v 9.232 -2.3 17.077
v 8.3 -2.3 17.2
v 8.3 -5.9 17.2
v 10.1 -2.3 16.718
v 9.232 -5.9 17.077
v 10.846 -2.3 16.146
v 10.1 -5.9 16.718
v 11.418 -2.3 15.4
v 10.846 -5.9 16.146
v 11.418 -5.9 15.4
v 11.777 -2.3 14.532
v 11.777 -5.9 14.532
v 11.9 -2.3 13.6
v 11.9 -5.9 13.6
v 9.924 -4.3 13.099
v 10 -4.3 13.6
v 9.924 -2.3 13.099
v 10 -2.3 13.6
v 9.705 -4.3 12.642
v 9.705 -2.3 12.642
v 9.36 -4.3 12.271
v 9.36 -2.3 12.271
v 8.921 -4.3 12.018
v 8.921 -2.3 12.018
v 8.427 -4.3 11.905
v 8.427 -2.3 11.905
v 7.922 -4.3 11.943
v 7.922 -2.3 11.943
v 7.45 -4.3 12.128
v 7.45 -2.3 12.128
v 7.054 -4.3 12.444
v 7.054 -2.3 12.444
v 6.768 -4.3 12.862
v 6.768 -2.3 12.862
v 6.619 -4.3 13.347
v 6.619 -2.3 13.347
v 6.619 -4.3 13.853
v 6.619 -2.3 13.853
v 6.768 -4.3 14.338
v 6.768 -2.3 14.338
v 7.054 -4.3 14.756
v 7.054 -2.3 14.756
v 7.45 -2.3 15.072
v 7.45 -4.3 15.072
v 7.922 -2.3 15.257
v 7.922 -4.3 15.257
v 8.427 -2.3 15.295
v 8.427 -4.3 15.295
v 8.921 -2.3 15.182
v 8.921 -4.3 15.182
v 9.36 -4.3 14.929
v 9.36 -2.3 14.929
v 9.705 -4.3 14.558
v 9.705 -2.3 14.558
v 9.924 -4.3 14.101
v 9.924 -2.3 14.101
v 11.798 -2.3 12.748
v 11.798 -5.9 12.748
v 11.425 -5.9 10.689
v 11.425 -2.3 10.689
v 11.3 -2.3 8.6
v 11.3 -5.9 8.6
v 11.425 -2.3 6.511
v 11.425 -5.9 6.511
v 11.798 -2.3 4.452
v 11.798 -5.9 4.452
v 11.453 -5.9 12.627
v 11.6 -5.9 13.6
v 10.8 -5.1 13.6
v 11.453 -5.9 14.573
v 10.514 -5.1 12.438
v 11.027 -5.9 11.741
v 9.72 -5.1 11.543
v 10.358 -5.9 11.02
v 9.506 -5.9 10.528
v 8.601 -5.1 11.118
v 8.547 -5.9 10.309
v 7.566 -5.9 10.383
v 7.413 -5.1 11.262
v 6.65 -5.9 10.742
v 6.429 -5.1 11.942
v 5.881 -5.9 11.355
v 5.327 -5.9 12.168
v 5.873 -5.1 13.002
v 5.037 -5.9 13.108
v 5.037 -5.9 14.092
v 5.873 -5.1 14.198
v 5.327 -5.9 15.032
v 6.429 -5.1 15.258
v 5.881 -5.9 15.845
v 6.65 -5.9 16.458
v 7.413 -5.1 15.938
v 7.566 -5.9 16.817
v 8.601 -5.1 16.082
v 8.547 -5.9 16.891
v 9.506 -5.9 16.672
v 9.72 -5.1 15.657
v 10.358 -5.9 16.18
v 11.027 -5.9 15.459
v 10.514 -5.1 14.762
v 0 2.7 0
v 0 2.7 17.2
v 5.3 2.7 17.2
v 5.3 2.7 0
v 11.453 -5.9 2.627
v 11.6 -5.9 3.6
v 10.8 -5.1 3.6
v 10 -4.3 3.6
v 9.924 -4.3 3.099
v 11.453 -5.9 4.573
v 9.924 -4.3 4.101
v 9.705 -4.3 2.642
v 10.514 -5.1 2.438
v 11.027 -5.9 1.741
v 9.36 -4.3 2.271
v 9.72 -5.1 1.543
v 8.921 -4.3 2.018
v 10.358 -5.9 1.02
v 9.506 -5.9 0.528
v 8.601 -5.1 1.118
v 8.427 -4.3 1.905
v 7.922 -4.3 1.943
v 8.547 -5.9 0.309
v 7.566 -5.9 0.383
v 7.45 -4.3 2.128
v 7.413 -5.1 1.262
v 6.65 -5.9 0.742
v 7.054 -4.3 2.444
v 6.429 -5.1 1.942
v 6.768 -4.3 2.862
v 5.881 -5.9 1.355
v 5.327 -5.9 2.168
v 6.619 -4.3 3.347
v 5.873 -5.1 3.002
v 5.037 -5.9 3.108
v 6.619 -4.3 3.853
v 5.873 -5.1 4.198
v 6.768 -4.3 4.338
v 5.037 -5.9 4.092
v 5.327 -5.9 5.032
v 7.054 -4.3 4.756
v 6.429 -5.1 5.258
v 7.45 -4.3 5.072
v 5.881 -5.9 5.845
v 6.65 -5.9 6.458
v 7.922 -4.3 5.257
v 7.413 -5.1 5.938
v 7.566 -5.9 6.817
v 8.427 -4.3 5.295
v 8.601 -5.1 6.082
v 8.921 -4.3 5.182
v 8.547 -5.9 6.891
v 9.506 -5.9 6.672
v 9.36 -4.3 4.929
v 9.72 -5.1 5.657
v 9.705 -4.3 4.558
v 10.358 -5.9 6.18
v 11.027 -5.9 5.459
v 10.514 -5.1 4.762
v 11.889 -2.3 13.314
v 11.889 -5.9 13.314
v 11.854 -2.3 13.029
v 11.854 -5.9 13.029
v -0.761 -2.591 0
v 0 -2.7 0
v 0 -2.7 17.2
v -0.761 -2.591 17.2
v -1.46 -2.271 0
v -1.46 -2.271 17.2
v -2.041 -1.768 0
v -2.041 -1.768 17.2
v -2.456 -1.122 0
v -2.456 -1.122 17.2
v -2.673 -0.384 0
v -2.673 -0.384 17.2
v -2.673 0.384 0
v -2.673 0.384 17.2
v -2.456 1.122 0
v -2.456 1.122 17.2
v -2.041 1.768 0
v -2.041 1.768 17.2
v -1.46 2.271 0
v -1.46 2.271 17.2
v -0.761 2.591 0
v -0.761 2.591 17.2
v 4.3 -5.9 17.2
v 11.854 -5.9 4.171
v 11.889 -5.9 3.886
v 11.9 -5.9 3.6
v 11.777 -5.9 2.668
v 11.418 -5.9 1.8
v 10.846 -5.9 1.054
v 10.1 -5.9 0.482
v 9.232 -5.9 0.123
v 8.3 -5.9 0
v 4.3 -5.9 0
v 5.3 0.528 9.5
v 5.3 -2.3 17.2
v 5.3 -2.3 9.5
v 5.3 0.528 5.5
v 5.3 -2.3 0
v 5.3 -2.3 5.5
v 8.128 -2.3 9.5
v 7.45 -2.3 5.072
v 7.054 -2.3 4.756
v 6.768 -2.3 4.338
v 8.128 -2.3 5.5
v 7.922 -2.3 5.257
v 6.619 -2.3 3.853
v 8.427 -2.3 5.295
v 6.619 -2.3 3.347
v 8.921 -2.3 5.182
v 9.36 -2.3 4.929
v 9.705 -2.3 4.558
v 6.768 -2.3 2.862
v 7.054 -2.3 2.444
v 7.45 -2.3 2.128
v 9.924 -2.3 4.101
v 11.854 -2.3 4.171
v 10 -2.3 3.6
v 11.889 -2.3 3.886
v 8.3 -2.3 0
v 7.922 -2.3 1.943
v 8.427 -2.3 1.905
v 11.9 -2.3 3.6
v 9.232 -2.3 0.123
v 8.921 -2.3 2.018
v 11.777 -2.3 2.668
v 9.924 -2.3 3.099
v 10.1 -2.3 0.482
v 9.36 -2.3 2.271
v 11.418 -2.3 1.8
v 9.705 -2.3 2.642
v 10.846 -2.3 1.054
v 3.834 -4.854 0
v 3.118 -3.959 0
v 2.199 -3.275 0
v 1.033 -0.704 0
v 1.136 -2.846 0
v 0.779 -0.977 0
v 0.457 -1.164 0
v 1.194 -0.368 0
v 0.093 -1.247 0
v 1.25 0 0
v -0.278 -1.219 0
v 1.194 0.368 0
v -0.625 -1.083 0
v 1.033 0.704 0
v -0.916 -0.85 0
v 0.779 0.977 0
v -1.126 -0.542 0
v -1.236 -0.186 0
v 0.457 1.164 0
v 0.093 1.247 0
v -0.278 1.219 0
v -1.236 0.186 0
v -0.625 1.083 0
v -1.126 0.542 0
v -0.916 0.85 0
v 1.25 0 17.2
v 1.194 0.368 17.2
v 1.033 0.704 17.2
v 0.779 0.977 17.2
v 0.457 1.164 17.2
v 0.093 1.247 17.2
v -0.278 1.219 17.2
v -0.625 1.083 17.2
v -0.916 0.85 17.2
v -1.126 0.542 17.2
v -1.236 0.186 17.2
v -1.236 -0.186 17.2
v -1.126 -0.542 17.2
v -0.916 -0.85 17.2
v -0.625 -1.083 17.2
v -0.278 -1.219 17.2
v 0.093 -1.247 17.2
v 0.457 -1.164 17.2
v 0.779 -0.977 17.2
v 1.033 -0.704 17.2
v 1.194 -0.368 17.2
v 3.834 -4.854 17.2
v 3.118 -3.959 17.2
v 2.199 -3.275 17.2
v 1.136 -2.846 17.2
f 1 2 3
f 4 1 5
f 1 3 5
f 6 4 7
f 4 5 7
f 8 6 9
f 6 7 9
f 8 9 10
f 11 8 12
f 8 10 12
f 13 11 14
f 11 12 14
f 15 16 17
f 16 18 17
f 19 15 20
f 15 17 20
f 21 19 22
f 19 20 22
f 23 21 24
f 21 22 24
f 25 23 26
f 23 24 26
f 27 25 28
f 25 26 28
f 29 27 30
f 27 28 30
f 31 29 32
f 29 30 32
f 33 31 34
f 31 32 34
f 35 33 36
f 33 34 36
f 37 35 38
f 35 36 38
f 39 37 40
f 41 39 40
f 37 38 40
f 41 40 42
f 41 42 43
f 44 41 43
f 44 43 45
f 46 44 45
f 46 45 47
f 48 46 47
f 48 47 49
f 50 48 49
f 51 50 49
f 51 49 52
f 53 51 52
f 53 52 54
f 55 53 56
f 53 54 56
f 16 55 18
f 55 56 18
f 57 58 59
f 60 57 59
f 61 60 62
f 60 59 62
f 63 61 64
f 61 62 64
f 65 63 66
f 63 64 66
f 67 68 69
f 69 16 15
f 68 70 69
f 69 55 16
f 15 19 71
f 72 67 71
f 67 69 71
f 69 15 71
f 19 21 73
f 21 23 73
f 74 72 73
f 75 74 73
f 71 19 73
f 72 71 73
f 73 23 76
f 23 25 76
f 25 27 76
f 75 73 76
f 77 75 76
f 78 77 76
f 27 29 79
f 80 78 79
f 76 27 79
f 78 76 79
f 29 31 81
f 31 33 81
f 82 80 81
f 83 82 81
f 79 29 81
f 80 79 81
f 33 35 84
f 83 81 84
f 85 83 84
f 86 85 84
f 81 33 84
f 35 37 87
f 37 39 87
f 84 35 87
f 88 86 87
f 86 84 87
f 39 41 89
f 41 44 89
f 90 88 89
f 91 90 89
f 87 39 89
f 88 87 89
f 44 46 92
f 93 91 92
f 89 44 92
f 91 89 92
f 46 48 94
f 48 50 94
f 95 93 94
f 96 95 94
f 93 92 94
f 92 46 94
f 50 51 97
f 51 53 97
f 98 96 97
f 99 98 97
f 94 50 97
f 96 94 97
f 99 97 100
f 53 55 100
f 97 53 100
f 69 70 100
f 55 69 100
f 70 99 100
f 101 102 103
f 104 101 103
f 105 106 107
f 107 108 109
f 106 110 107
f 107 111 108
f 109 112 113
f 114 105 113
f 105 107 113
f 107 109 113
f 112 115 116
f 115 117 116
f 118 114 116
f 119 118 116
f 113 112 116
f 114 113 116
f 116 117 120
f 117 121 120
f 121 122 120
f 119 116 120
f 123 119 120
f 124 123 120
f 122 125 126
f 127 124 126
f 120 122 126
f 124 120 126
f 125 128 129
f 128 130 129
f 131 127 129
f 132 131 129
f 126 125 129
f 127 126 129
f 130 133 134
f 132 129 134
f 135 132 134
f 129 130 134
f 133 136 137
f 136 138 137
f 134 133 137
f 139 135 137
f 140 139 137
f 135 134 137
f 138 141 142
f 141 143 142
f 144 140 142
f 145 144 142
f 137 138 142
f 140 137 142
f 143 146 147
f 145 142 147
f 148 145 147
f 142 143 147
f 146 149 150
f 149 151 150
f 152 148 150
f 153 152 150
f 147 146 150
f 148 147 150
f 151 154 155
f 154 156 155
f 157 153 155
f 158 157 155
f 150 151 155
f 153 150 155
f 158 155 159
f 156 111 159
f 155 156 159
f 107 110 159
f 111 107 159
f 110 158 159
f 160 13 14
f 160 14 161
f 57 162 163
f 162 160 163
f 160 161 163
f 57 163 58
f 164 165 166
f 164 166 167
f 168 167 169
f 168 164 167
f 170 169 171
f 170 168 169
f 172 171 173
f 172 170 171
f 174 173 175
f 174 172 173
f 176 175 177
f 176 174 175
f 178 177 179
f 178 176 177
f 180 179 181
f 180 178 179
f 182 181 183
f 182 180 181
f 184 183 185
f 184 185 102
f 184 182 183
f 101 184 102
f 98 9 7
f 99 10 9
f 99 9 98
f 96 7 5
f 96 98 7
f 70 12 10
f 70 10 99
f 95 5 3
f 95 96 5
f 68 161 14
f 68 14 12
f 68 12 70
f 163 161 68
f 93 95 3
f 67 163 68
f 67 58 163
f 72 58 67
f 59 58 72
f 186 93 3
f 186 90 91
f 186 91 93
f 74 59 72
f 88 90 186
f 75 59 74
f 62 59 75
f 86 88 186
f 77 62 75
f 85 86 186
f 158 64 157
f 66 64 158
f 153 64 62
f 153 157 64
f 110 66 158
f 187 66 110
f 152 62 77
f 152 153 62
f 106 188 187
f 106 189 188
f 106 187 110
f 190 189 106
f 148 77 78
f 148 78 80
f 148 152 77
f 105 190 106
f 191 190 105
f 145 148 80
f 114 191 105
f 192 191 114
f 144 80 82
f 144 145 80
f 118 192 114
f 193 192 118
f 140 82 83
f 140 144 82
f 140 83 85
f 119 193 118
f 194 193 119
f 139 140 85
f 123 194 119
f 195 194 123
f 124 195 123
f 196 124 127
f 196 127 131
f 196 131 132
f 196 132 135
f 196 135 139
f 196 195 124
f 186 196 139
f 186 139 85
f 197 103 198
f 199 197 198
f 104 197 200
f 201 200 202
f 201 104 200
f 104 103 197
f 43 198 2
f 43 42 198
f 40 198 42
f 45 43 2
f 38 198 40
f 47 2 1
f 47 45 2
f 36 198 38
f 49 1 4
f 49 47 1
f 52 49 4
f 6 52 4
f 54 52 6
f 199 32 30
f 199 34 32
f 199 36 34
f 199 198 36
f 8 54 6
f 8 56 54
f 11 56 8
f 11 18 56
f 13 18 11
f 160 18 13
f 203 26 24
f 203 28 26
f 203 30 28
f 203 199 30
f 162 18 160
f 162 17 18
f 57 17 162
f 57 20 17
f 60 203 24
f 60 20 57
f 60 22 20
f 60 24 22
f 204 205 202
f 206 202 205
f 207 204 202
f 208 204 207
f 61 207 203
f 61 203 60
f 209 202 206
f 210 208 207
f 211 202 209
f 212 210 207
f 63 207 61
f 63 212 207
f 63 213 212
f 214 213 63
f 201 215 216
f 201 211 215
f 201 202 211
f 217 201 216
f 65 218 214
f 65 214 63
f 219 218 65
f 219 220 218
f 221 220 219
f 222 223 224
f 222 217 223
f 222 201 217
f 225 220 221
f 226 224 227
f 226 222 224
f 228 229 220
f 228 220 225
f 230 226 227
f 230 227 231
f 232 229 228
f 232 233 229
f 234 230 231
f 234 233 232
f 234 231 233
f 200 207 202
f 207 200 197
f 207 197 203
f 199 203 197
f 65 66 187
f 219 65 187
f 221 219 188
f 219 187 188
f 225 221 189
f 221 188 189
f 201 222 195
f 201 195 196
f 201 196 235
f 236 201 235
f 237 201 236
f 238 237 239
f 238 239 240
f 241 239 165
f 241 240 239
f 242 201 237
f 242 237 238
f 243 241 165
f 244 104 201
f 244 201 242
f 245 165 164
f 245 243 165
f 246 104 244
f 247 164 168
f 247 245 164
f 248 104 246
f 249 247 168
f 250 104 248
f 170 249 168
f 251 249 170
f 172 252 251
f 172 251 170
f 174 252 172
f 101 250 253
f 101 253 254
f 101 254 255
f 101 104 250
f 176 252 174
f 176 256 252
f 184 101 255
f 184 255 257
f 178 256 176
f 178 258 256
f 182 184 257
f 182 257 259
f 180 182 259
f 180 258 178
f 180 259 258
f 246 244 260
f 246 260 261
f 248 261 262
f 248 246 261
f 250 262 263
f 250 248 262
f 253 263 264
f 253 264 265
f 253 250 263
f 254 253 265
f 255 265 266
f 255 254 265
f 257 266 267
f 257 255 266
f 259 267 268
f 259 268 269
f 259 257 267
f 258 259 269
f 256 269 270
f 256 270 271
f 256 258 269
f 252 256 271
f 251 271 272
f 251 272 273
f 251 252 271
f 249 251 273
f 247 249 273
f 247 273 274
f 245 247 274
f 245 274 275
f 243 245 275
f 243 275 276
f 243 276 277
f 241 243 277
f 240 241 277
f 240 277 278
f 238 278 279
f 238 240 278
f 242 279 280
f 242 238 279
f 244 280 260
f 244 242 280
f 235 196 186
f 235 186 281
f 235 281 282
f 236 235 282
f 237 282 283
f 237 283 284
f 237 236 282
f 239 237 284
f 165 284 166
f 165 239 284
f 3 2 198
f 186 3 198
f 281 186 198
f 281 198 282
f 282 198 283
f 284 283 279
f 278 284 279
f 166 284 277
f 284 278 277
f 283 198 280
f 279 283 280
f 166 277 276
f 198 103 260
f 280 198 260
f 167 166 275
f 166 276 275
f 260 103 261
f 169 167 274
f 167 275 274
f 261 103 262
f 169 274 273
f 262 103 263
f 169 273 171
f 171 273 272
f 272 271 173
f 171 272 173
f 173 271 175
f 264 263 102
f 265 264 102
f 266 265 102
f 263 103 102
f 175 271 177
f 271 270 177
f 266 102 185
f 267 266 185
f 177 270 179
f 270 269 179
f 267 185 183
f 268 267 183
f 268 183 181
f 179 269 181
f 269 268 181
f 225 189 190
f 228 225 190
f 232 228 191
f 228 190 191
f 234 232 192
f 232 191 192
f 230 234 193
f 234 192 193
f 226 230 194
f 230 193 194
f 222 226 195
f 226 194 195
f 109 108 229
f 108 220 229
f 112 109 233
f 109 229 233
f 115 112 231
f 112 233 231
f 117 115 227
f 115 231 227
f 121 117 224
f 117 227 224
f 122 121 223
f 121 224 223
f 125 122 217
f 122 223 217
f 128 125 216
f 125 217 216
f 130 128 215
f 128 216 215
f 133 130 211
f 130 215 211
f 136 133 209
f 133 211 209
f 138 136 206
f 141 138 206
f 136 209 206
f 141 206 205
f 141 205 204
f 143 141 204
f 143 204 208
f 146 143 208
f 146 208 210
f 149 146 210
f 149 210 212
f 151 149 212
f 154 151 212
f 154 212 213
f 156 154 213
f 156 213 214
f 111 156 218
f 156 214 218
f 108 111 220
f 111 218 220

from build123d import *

# Parameters (mm, degrees)
SKETCH_1_R                = 1.25
EXTRUDE_1_DEPTH           = 17.2
CUT_EXTRUDE_1_DEPTH       = 9.6
EXTRUDE_2_DEPTH           = 4
HOLE_WIZARD_1_D           = 3.4
HOLE_WIZARD_1_DEPTH       = 8.6
HOLE_WIZARD_1_CSINK_D     = 6.6
HOLE_WIZARD_1_CSINK_ANGLE = 90
HOLE_WIZARD_1_TIP         = 1.021463052


with BuildPart() as part:
    # 草图1 → 凸台-拉伸1 (new body)
    with BuildSketch(Plane.XY):
        with BuildLine():
            Line((0, 2.7), (5.3, 2.7))
            Line((5.3, 2.7), (5.3, -2.3))
            Line((5.3, -2.3), (12.8, -2.3))
            Line((12.8, -2.3), (12.8, -5.9))
            Line((12.8, -5.9), (4.3, -5.9))
            ThreePointArc((4.3, -5.9), (2.680018657, -3.58778743), (0, -2.7))
            ThreePointArc((0, -2.7), (-2.7, 0), (0, 2.7))
        make_face()
        Circle(SKETCH_1_R, mode=Mode.SUBTRACT)
    extrude(amount=EXTRUDE_1_DEPTH)

    # 草图6 → 切除-拉伸1 (cut, through all)
    with BuildSketch(Plane.XZ.offset(5.9)):
        with BuildLine():
            Line((8.3, 0), (12.8, 0))
            Line((12.8, 0), (12.8, 17.2))
            Line((12.8, 17.2), (8.3, 17.2))
            ThreePointArc((8.3, 17.2), (10.845584412, 16.145584412), (11.9, 13.6))
            ThreePointArc((11.9, 13.6), (11.874356619, 13.171077206), (11.797791798, 12.748264984))
            ThreePointArc((11.797791798, 12.748264984), (11.3, 8.6), (11.797791798, 4.451735016))
            ThreePointArc((11.797791798, 4.451735016), (11.874356619, 4.028922794), (11.9, 3.6))
            ThreePointArc((11.9, 3.6), (10.845584412, 1.054415588), (8.3, 0))
        make_face()
    extrude(amount=-CUT_EXTRUDE_1_DEPTH, mode=Mode.SUBTRACT)

    # 草图7 → 凸台-拉伸2 (add)
    with BuildSketch(Plane.XY.offset(5.5)):
        Polygon((8.128427125, -2.3), (5.3, -2.3), (5.3, 0.528427125), align=None)
    extrude(amount=EXTRUDE_2_DEPTH)

    # 打孔尺寸(%根据)开槽半沉头木螺钉的类型1
    with Locations(Plane(origin=(8.3, -5.9, 3.6), x_dir=(-1, 0, 0), z_dir=(0, -1, 0))):
        with Locations((0, 0), (0, -10)):
            CounterSinkHole(HOLE_WIZARD_1_D / 2, HOLE_WIZARD_1_CSINK_D / 2, depth=HOLE_WIZARD_1_DEPTH, counter_sink_angle=HOLE_WIZARD_1_CSINK_ANGLE)
            with Locations((0, 0, -(HOLE_WIZARD_1_DEPTH + HOLE_WIZARD_1_TIP / 2))):  # 118° drill point
                Cone(0, HOLE_WIZARD_1_D / 2, HOLE_WIZARD_1_TIP, mode=Mode.SUBTRACT)


solid = part.part
